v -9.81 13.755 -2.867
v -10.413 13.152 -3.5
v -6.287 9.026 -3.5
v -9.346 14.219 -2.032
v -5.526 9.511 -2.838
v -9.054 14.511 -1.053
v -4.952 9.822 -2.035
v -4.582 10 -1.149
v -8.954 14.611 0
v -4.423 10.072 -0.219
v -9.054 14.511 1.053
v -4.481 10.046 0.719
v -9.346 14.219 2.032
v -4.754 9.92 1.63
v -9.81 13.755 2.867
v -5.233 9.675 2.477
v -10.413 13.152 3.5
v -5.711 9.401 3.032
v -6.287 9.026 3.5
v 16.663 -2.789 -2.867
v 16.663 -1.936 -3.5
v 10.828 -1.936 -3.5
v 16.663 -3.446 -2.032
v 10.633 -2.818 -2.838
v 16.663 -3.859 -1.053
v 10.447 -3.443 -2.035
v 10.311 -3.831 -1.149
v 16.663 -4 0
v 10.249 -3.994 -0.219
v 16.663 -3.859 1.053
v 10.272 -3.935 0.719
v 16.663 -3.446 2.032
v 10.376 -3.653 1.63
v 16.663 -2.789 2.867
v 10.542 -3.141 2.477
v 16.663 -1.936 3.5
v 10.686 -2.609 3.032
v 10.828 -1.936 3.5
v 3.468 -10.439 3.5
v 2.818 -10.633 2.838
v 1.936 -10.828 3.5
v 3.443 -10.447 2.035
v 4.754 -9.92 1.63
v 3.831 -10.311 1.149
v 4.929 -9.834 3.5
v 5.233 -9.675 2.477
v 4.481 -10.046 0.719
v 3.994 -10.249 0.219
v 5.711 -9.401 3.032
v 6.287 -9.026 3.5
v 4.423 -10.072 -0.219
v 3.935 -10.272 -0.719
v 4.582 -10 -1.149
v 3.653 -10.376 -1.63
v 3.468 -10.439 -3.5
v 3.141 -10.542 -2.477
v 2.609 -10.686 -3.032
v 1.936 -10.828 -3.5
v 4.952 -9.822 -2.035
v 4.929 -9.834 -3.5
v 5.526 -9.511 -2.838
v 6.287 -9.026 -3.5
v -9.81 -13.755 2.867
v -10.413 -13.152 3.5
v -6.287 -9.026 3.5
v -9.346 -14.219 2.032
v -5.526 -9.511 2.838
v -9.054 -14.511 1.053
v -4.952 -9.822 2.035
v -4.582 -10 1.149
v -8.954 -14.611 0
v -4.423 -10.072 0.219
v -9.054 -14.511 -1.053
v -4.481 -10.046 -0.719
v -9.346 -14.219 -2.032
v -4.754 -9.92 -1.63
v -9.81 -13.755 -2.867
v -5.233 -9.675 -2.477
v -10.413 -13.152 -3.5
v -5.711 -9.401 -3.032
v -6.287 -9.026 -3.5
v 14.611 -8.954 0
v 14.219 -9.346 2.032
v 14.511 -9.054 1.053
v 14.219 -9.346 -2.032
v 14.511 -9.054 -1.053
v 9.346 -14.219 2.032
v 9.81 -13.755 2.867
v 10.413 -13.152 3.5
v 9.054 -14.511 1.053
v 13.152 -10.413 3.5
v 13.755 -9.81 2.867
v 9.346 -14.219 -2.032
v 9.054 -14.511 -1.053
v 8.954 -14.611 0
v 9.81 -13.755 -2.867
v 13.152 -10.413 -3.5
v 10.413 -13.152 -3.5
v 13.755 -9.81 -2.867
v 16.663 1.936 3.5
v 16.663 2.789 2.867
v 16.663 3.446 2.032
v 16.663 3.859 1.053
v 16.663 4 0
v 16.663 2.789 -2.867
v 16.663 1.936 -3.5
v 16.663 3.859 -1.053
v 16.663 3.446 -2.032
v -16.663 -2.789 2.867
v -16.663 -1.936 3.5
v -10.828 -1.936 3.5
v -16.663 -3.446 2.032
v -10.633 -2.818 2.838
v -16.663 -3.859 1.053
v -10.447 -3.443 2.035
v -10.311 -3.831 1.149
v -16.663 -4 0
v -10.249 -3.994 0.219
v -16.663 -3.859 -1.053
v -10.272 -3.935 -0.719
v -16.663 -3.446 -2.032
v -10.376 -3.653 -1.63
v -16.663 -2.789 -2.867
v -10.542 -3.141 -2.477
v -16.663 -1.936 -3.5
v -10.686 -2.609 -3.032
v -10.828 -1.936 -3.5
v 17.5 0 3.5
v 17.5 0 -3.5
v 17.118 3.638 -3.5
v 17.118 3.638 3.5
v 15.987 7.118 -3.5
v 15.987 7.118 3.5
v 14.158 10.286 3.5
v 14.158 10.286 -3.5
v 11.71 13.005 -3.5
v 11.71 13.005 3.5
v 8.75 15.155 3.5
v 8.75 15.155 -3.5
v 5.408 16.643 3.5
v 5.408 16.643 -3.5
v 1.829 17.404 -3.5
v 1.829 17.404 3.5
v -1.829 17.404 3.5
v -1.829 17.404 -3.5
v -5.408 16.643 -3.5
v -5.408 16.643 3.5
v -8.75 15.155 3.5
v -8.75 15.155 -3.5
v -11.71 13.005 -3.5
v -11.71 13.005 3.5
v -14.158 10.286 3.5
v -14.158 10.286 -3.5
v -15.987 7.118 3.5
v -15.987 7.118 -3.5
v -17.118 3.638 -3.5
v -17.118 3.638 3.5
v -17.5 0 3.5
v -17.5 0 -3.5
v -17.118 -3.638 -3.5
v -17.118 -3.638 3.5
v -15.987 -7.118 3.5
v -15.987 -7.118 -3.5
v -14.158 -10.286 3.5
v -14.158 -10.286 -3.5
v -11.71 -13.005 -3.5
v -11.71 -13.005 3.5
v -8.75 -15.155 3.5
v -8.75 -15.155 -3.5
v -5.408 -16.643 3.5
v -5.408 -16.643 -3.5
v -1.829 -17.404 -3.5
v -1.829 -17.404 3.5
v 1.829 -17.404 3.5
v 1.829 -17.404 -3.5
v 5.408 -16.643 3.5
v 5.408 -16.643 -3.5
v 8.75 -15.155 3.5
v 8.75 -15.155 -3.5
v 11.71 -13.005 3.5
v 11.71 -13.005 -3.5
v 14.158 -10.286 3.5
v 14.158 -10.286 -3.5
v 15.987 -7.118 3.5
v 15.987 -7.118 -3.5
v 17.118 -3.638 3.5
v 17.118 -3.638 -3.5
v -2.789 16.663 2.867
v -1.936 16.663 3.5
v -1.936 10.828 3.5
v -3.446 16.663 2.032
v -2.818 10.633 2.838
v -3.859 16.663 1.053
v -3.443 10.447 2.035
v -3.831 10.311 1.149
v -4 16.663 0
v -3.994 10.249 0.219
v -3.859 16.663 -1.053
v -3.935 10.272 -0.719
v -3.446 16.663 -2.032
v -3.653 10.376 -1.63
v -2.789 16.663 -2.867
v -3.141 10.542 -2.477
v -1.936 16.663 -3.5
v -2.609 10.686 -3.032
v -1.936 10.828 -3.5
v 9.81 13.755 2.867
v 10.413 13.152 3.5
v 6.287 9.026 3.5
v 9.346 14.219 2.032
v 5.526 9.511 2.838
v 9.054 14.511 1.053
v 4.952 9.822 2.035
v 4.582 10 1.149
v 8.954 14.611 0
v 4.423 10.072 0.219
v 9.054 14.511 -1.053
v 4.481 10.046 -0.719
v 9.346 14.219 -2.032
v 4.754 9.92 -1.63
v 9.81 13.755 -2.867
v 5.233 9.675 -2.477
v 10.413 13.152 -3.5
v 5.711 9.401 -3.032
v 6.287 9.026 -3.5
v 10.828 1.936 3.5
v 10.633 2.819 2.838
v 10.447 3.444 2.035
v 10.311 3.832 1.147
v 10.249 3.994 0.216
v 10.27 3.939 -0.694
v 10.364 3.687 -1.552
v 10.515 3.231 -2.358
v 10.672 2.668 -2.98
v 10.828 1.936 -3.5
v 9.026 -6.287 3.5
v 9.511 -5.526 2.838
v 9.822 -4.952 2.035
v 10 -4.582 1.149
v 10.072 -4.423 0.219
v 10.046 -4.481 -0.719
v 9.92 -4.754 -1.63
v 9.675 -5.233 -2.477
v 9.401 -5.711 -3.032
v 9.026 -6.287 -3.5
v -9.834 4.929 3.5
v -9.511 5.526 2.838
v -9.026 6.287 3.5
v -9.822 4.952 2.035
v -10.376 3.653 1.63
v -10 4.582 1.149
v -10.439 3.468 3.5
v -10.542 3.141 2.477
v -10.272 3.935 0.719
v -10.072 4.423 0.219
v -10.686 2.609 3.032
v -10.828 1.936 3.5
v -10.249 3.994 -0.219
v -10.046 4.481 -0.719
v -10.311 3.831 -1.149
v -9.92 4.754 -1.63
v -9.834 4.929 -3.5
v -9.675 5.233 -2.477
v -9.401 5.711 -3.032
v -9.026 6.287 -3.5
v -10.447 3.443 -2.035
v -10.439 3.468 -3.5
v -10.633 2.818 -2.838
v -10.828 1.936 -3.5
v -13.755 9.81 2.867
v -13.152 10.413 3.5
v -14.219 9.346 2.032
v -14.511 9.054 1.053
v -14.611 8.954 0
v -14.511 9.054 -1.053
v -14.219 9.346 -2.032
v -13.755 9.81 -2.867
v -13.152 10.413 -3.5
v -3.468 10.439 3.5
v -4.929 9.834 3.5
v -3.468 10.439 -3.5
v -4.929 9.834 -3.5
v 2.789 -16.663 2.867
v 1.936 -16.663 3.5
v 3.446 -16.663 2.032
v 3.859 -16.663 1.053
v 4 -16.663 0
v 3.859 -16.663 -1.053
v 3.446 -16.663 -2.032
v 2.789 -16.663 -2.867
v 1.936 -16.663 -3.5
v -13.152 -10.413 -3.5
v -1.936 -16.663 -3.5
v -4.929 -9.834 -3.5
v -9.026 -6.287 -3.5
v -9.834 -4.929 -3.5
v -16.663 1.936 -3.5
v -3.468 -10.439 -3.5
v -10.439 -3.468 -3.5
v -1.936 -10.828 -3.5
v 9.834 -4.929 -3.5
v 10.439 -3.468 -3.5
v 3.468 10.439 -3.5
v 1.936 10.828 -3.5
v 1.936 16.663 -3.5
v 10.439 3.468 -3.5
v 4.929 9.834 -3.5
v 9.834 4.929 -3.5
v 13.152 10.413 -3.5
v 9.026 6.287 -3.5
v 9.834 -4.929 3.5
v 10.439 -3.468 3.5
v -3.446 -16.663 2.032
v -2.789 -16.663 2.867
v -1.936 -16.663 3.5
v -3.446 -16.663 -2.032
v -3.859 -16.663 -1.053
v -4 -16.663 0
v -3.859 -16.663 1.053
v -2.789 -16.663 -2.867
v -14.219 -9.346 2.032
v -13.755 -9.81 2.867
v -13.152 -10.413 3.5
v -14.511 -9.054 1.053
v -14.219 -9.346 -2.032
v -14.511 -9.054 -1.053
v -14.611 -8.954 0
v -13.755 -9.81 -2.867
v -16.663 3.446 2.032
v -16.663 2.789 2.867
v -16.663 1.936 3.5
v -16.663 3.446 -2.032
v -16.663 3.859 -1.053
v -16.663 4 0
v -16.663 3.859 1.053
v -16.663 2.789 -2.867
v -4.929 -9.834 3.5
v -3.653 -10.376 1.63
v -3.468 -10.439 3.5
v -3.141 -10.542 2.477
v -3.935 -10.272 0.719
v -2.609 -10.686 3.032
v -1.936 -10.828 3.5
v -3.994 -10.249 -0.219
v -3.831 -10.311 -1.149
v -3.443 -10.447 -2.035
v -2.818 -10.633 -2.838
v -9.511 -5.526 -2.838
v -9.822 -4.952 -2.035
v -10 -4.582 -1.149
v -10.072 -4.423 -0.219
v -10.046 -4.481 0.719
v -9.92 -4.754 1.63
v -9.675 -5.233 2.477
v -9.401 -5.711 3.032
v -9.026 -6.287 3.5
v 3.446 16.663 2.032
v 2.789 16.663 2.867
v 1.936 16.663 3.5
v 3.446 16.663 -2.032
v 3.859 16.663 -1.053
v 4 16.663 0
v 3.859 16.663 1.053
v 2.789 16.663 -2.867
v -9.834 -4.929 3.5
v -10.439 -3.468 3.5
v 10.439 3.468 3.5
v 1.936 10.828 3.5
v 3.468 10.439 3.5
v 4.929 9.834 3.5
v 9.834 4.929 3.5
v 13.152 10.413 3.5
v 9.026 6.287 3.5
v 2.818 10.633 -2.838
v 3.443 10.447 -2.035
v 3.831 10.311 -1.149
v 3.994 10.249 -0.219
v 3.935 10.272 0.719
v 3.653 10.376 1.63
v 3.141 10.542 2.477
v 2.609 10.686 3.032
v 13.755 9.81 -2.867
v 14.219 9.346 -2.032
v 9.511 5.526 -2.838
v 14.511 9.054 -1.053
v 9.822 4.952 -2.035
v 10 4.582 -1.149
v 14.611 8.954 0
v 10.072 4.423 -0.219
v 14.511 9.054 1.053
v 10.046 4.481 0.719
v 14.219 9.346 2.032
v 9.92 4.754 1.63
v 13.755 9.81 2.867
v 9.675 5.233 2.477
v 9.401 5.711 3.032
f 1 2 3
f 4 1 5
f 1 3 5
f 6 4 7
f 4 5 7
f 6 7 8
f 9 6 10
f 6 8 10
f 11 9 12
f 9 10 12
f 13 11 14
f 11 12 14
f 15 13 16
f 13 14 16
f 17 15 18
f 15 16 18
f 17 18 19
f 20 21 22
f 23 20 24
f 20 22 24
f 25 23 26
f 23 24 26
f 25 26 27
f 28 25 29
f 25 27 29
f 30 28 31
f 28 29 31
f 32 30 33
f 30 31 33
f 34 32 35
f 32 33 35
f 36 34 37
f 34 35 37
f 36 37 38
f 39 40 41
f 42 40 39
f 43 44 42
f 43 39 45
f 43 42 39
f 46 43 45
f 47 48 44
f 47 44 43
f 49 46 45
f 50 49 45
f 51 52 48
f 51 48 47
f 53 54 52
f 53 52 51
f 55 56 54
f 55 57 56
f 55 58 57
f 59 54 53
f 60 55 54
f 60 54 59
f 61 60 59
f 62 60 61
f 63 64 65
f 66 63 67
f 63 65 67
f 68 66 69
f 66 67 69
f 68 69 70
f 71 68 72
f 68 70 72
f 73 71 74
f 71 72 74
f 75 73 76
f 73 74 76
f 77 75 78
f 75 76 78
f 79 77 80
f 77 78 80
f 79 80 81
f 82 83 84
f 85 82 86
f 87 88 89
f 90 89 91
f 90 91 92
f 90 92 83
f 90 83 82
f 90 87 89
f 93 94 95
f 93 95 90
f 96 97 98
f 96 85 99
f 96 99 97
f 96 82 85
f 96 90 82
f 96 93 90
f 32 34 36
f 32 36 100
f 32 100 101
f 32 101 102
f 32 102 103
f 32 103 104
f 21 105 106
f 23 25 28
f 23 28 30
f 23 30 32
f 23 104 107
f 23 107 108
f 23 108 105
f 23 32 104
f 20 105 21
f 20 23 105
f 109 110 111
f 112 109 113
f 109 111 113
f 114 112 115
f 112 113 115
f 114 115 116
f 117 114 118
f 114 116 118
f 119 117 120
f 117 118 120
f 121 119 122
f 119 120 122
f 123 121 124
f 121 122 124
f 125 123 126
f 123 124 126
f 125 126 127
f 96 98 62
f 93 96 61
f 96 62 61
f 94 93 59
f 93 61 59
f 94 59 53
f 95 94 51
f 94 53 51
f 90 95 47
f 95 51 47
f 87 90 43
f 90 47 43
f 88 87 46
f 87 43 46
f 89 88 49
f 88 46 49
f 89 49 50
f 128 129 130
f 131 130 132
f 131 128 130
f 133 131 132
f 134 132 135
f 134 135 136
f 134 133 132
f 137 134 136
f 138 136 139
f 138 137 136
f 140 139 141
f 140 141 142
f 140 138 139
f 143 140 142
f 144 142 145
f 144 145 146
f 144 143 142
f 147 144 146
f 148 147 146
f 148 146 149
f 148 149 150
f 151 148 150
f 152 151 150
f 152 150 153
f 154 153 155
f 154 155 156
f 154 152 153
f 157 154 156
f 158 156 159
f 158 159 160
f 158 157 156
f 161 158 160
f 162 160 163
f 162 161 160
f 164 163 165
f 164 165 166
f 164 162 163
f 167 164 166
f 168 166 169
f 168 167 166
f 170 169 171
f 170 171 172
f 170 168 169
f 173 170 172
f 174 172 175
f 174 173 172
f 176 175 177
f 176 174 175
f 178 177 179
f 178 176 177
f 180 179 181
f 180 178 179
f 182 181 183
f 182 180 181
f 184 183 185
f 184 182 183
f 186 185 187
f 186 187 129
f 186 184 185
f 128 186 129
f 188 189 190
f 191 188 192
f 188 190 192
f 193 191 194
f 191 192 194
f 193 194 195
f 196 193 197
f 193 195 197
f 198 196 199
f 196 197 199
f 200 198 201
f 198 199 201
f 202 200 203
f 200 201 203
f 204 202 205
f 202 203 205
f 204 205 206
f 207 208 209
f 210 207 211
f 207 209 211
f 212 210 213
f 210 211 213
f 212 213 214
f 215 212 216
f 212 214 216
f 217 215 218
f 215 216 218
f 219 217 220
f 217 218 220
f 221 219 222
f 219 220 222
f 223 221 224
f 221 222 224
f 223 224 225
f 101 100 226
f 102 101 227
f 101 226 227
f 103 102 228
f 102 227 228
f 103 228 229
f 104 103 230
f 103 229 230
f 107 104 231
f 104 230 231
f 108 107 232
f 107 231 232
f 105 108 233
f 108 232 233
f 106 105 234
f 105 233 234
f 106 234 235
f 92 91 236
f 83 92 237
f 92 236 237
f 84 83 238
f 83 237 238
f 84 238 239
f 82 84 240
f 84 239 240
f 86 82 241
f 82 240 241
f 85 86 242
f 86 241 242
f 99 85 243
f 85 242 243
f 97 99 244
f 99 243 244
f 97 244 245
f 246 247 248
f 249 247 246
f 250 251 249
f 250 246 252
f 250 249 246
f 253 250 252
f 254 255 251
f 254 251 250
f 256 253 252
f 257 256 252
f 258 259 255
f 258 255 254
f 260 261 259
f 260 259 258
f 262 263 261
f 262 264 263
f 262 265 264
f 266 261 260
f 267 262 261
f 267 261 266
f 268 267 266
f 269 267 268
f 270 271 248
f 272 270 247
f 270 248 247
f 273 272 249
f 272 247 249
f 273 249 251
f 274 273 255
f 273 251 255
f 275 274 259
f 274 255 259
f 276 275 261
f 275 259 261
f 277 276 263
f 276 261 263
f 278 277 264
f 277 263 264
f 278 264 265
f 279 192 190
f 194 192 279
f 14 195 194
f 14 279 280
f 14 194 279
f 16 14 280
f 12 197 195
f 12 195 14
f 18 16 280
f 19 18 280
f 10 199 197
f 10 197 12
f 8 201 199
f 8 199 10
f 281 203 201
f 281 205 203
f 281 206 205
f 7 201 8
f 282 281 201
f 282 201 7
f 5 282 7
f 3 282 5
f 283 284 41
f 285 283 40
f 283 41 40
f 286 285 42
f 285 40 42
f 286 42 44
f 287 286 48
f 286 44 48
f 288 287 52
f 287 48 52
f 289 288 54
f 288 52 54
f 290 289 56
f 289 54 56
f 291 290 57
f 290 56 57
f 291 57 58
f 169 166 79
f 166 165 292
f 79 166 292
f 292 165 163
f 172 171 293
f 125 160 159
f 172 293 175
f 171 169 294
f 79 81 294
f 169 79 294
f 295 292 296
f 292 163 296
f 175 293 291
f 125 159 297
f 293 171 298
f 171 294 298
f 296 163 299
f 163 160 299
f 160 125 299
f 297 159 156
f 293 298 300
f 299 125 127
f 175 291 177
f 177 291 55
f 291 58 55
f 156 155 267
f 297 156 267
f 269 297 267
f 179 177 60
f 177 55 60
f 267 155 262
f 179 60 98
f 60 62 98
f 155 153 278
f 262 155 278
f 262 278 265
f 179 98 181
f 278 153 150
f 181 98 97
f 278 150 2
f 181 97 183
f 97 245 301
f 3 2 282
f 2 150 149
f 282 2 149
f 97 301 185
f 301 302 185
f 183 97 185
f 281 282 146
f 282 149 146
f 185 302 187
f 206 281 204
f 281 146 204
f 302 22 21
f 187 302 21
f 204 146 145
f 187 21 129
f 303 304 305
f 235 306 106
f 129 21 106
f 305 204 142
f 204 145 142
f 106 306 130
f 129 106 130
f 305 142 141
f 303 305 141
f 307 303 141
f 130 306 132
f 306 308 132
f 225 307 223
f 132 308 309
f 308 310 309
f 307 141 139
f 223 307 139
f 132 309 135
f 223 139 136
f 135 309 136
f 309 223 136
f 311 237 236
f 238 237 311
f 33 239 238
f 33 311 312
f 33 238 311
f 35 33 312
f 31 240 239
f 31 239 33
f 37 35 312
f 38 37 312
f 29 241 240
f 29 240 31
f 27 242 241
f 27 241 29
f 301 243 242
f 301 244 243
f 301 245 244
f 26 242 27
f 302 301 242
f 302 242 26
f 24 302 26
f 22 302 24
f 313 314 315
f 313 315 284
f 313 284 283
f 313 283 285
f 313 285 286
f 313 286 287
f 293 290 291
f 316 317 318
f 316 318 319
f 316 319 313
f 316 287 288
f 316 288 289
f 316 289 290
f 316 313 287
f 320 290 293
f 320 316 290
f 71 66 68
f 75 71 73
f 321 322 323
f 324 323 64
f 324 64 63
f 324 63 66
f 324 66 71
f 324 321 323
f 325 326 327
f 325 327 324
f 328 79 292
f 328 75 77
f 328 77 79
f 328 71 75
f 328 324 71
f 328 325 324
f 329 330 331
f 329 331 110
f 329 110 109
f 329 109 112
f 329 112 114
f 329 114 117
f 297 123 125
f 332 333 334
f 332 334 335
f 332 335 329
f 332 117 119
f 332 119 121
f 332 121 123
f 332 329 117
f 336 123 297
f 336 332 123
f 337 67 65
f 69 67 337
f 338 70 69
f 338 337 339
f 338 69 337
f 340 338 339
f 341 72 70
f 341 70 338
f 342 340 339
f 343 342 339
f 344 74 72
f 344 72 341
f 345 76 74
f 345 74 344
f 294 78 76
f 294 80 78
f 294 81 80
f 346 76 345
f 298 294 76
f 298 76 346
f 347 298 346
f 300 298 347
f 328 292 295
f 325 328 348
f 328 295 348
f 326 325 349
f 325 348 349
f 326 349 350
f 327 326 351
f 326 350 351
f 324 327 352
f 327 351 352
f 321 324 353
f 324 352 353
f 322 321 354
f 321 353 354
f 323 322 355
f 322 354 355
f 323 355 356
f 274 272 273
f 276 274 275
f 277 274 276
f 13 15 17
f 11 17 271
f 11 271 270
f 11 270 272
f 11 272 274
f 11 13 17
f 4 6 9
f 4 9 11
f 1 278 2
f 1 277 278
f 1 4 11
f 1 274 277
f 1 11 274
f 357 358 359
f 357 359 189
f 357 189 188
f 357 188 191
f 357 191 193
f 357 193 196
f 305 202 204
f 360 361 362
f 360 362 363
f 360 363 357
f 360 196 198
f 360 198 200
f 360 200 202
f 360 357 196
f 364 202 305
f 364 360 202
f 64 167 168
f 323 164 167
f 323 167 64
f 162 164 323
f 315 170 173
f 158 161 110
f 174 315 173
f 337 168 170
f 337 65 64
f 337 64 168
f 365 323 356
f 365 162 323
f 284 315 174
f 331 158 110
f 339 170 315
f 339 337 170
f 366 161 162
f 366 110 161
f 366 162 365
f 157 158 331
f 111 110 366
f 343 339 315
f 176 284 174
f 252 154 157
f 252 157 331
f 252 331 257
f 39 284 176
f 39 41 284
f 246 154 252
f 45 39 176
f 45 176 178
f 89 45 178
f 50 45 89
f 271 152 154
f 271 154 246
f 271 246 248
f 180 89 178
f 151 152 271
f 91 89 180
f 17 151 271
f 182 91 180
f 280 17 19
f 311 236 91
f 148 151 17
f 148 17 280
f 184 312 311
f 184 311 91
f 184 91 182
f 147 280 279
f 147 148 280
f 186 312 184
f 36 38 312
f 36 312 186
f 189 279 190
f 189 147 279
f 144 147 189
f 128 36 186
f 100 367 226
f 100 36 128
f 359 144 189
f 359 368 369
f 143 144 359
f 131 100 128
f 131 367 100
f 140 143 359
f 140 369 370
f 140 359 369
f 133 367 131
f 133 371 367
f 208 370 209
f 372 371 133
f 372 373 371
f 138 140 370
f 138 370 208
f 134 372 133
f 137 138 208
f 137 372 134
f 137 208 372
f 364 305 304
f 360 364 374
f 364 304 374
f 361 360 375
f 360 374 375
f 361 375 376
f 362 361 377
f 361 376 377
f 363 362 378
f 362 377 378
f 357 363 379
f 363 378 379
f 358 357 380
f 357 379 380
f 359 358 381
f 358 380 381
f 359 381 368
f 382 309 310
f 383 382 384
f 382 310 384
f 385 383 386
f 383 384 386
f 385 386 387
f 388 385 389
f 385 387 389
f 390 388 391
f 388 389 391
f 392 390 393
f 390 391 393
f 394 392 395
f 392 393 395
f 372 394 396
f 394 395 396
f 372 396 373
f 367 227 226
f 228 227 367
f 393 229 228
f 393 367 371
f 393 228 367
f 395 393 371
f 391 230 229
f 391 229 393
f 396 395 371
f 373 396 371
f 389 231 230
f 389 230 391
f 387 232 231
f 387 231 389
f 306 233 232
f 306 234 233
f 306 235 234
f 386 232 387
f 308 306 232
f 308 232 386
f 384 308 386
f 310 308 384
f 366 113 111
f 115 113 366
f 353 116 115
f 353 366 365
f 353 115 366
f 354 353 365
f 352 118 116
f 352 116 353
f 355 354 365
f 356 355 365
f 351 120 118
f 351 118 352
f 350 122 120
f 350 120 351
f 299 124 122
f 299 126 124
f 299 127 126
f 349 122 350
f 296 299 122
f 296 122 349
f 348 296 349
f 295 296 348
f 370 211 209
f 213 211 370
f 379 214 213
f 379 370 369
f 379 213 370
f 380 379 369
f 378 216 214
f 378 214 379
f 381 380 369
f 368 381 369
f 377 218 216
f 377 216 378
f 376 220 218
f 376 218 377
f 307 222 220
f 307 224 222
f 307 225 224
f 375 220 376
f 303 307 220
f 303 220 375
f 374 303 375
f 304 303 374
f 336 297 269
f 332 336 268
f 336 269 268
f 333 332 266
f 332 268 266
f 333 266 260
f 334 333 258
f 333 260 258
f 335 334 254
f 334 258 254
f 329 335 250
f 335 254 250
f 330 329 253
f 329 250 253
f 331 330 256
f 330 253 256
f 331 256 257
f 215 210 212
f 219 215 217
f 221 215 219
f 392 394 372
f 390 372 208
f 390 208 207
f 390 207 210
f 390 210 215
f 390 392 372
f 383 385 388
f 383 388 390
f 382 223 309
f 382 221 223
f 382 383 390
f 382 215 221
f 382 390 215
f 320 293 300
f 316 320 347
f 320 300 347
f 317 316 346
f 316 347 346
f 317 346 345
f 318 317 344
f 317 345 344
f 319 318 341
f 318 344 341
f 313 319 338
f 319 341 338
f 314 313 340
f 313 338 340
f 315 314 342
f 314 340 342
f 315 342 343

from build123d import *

# Parameters (mm, degrees)
SKETCH1_R           = 17.5
SKETCH1_R_2         = 11
BOSS_EXTRUDE1_DEPTH = 3.5
SKETCH4_R           = 4
CUT_EXTRUDE1_DEPTH  = 6.5
CIRPATTERN1_COUNT   = 8


with BuildPart() as part:
    # Sketch1 → Boss-Extrude1 (new, symmetric)
    with BuildSketch(Plane.XY):
        Circle(SKETCH1_R)
        Circle(SKETCH1_R_2, mode=Mode.SUBTRACT)
    extrude(amount=BOSS_EXTRUDE1_DEPTH, both=True)

    # Sketch4 → Cut-Extrude1 (cut)
    with BuildSketch(Plane(origin=(-10.162674858, 0, 0), x_dir=(0, 0, -1), z_dir=(1, 0, 0))):
        Circle(SKETCH4_R)
    cut_extrude1 = extrude(amount=-CUT_EXTRUDE1_DEPTH, mode=Mode.SUBTRACT)

    # CirPattern1: Cut-Extrude1 ×8 about axis
    cirpattern1_axis = Axis((0, 0, 3.5), (0, 0, -1))
    for i in range(1, CIRPATTERN1_COUNT):
        add(cut_extrude1.rotate(cirpattern1_axis, i * 360 / CIRPATTERN1_COUNT), mode=Mode.SUBTRACT)


solid = part.part
